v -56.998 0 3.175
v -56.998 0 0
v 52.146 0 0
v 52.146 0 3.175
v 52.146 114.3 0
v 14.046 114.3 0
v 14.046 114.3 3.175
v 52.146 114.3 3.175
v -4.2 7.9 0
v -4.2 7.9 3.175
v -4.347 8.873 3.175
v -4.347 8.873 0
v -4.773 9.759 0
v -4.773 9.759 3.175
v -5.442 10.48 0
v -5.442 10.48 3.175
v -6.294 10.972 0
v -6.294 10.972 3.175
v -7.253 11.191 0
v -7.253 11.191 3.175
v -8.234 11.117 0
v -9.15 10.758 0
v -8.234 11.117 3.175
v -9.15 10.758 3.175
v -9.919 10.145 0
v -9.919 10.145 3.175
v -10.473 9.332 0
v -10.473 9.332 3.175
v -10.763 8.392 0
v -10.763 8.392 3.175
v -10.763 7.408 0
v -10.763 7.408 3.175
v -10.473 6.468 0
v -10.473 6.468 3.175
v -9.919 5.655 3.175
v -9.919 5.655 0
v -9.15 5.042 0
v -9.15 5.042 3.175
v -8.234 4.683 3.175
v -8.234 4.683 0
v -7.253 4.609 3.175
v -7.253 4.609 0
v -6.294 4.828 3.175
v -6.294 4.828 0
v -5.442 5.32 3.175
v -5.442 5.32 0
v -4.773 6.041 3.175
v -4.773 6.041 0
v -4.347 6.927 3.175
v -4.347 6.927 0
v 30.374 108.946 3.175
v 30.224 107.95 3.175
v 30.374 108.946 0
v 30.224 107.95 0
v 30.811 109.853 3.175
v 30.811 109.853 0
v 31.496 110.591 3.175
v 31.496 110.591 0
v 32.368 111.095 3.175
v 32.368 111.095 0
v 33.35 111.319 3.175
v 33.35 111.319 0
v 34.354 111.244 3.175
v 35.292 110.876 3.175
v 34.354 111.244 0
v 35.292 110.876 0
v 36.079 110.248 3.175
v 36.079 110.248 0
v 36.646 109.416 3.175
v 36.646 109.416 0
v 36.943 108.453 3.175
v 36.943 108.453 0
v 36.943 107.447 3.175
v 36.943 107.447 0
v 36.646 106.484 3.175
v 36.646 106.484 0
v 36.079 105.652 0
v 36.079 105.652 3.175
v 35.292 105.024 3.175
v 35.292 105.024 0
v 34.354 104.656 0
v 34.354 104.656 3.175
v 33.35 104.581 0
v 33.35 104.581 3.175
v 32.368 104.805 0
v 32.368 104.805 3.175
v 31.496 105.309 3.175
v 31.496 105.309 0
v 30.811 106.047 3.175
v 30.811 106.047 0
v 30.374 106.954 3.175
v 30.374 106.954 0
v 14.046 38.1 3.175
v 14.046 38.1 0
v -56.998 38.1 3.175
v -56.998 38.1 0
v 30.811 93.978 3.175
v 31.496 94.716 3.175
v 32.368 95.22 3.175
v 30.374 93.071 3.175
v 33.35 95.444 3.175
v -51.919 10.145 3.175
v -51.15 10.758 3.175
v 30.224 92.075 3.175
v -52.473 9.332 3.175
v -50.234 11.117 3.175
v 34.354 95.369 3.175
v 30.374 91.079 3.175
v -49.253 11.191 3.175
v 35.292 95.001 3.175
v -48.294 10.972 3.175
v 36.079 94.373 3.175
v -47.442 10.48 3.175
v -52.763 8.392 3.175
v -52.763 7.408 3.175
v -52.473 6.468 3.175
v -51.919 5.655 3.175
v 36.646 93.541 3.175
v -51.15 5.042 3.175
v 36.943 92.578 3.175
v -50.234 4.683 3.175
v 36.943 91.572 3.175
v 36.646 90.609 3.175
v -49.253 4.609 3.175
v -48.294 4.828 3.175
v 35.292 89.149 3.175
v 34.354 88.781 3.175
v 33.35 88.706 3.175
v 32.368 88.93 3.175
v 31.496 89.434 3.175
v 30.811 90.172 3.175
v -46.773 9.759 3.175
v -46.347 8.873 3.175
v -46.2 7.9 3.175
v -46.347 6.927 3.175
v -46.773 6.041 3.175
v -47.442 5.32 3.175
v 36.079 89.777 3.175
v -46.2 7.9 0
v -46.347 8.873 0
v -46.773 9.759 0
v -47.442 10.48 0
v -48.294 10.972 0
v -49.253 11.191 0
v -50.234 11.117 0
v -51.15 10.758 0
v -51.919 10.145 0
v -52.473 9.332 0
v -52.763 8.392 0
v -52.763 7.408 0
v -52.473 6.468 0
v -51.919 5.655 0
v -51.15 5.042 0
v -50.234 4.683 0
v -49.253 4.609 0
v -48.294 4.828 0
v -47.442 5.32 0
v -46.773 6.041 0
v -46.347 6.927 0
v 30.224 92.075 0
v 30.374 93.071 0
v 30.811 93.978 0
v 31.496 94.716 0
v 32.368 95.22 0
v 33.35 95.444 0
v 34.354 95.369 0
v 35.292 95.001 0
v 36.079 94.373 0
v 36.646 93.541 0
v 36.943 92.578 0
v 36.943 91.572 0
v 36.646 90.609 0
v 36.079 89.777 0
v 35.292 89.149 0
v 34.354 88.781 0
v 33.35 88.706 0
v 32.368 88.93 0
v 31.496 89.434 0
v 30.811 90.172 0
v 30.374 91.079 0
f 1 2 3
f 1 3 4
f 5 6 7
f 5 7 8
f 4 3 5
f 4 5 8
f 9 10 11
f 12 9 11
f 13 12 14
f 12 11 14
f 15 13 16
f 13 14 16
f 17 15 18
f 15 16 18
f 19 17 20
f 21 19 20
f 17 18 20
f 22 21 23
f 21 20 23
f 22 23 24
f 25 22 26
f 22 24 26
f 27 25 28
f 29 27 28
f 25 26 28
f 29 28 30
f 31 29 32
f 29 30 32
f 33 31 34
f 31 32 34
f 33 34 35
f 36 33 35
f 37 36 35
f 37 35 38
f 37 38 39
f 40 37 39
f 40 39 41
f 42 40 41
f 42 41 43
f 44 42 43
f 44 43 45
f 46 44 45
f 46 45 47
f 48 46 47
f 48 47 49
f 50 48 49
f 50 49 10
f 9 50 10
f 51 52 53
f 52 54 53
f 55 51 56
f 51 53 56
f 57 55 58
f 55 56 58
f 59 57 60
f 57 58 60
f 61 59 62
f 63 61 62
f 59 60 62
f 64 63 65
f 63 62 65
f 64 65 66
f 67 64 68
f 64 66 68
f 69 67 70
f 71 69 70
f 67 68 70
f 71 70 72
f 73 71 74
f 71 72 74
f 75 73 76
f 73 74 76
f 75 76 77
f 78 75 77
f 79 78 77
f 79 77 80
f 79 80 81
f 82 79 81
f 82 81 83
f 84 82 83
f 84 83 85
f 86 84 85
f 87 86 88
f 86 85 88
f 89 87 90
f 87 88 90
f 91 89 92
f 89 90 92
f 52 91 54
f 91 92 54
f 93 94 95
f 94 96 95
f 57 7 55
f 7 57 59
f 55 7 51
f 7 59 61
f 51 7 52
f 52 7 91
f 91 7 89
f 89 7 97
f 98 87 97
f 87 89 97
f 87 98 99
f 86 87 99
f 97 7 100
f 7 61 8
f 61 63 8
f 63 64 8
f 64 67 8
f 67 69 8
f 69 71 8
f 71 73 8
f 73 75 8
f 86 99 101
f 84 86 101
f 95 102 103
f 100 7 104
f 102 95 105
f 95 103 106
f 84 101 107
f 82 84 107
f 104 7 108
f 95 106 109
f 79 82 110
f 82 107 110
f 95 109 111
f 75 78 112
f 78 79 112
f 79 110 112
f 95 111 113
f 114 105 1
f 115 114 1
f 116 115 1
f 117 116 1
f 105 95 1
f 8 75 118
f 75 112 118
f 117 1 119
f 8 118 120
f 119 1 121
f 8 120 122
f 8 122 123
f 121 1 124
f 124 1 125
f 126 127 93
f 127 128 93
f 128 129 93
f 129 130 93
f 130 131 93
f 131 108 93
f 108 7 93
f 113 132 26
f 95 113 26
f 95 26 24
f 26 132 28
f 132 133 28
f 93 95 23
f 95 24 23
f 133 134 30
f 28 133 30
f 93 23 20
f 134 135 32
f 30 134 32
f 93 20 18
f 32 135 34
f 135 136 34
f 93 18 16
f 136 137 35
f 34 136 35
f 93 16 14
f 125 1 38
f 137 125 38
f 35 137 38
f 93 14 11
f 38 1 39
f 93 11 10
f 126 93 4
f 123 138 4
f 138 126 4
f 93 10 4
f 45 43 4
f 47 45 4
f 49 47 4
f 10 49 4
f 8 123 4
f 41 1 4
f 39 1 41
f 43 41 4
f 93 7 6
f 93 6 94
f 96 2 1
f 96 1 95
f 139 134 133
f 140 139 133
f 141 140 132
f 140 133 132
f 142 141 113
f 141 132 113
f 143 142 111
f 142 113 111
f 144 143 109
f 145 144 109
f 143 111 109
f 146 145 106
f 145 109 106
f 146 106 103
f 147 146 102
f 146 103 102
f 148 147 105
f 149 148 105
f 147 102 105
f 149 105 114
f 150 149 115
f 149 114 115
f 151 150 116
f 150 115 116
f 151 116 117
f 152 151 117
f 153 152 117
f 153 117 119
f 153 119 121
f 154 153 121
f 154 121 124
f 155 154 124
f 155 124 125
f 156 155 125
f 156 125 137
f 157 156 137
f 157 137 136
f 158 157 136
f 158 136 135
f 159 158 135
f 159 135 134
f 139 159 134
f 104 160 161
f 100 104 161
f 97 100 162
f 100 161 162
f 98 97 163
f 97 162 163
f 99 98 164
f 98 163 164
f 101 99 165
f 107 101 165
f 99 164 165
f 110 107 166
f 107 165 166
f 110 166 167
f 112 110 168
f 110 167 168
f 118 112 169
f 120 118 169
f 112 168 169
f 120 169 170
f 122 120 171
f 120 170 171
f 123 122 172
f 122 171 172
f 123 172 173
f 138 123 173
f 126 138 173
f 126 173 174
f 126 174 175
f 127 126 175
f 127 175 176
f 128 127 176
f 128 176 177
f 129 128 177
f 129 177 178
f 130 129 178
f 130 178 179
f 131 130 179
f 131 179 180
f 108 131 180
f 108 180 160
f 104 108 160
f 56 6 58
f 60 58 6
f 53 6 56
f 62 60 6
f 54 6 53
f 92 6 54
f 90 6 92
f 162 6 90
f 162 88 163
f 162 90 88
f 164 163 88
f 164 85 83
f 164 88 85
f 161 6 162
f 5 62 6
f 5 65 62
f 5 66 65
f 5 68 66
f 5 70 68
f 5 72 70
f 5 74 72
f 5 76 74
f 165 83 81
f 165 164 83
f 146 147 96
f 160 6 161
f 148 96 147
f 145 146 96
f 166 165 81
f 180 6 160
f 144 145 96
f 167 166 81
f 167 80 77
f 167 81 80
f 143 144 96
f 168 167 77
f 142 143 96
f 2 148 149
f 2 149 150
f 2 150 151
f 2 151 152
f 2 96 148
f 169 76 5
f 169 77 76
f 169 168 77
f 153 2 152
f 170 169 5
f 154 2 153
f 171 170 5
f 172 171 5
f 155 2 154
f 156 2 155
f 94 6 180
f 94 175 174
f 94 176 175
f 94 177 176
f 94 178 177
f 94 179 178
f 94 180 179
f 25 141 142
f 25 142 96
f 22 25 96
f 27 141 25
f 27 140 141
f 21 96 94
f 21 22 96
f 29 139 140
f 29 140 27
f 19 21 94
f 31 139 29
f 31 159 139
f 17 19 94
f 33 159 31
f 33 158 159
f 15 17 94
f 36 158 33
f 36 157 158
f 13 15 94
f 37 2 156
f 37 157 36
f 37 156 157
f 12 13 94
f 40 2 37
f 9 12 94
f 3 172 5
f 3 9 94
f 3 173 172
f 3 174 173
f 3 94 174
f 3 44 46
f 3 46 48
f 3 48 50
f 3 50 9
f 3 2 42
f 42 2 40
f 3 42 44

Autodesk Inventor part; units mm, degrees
ref_plane "YZ Plane" through (0, 0, 0) normal (1, 0, 0) x (0, 1, 0)
ref_plane "XZ Plane" through (0, 0, 0) normal (0, 1, 0) x (-1, 0, 0)
ref_plane "XY Plane" through (0, 0, 0) normal (0, 0, 1) x (1, 0, 0)
sketch "Sketch1" plane through (0, 0, 0) normal (0, 0, 1) x (1, 0, 0)
  line L0 (0, 0) -> (-56.9976, 0)
  line L1 (-56.9976, 0) -> (-56.9976, 38.1)
  line L2 (-56.9976, 38.1) -> (0, 38.1)
  line L3 (0, 38.1) -> (0, 0)
  line L4 (0, 38.1) -> (-7.493, 38.1)
  line L5 (-7.493, 38.1) -> (-7.493, 8.1026)
  line L6 (-56.9976, 38.1) -> (-49.5046, 38.1)
  line L7 (-49.5046, 38.1) -> (-49.5046, 8.1026)
  dimension "d1" = 56.9976
  dimension "d2" = 38.1
  dimension "d3" = 7.493
  dimension "d4" = 29.9974
  dimension "d5" = 7.493
extrude "Plate1" add sketch "Sketch1" along normal blind 3.175
sketch "Sketch8" plane through (0, 0, 3.175) normal (0, 0, 1) x (1, 0, 0)
  circle A0 centre (-7.5, 7.9) radius 3.3 projected
  circle A1 centre (-49.5, 7.9) radius 3.3 projected
extrude "Cut1" cut sketch "Sketch8" against normal blind 3.175
sketch "Sketch10" plane through (0, 0, 3.175) normal (1, 0, 0) x (0, 0, -1)
  line L0 (0, 38.1) -> (0, 0) projected
  line L1 (3.175, 0) -> (0, 0) projected
  line L2 (3.175, 0) -> (3.175, 38.1) projected
  line L3 (3.175, 38.1) -> (0, 38.1) projected
extrude "Extrusion1" add sketch "Sketch10" along normal blind 52.1462
sketch "Sketch13" plane through (0, 38.1, 3.175) normal (0, 1, 0) x (1, 0, 0)
  line L0 (0, 3.175) -> (0, 0) projected
  line L1 (0, 0) -> (52.1462, 0) projected
  line L2 (52.1462, 3.175) -> (52.1462, 0) projected
  line L3 (0, 3.175) -> (52.1462, 3.175) projected
extrude "Extrusion2" add sketch "Sketch13" along normal blind 76.2
sketch "Sketch14" plane through (0, 0, 0) normal (0, 0, -1) x (-1, 0, 0)
  circle A0 centre (-33.6026, 107.95) radius 3.3782 projected
  circle A1 centre (-33.6026, 92.075) radius 3.3782 projected
  point P0 (0, 0)
extrude "Cut4" cut sketch "Sketch14" against normal blind 3.175
sketch "Sketch15" plane through (0, 0, 3.175) normal (0, 0, 1) x (1, 0, 0)
  line L0 (0, 114.3) -> (52.1462, 114.3) projected
  line L1 (0, 38.1) -> (0, 114.3) projected
  line L2 (-56.9976, 38.1) -> (0, 38.1) projected
  line L3 (52.1462, 114.3) -> (14.0462, 114.3)
  line L4 (14.0462, 114.3) -> (14.0462, 38.1)
  line L5 (14.0462, 38.1) -> (0, 38.1)
  point P0 (0, 0)
  dimension "d31" = 38.1
extrude "Cut5" cut sketch "Sketch15" against normal blind 3.175
equation "\"d19\" = Thickness"
equation "\"d29\" = Thickness"
equation "\"d32\" = Thickness"
equation "\"BendRadius\" = Thickness"
equation "\"BendReliefWidth\" = Thickness"
equation "\"BendReliefDepth\" = 0.5 * Thickness"
equation "\"CornerReliefSize\" = 4 * Thickness"
equation "\"MinimumRemnant\" = 2 * Thickness"
equation "\"TransitionRadius\" = BendRadius"
equation "\"JacobiRadiusSize\" = BendRadius"
equation "\"GapSize\" = Thickness"
equation "\"d8\" = BendRadius"
equation "\"Thickness\" = 3.175"
properties part number "endstop 3" material "Aluminum 6061"
